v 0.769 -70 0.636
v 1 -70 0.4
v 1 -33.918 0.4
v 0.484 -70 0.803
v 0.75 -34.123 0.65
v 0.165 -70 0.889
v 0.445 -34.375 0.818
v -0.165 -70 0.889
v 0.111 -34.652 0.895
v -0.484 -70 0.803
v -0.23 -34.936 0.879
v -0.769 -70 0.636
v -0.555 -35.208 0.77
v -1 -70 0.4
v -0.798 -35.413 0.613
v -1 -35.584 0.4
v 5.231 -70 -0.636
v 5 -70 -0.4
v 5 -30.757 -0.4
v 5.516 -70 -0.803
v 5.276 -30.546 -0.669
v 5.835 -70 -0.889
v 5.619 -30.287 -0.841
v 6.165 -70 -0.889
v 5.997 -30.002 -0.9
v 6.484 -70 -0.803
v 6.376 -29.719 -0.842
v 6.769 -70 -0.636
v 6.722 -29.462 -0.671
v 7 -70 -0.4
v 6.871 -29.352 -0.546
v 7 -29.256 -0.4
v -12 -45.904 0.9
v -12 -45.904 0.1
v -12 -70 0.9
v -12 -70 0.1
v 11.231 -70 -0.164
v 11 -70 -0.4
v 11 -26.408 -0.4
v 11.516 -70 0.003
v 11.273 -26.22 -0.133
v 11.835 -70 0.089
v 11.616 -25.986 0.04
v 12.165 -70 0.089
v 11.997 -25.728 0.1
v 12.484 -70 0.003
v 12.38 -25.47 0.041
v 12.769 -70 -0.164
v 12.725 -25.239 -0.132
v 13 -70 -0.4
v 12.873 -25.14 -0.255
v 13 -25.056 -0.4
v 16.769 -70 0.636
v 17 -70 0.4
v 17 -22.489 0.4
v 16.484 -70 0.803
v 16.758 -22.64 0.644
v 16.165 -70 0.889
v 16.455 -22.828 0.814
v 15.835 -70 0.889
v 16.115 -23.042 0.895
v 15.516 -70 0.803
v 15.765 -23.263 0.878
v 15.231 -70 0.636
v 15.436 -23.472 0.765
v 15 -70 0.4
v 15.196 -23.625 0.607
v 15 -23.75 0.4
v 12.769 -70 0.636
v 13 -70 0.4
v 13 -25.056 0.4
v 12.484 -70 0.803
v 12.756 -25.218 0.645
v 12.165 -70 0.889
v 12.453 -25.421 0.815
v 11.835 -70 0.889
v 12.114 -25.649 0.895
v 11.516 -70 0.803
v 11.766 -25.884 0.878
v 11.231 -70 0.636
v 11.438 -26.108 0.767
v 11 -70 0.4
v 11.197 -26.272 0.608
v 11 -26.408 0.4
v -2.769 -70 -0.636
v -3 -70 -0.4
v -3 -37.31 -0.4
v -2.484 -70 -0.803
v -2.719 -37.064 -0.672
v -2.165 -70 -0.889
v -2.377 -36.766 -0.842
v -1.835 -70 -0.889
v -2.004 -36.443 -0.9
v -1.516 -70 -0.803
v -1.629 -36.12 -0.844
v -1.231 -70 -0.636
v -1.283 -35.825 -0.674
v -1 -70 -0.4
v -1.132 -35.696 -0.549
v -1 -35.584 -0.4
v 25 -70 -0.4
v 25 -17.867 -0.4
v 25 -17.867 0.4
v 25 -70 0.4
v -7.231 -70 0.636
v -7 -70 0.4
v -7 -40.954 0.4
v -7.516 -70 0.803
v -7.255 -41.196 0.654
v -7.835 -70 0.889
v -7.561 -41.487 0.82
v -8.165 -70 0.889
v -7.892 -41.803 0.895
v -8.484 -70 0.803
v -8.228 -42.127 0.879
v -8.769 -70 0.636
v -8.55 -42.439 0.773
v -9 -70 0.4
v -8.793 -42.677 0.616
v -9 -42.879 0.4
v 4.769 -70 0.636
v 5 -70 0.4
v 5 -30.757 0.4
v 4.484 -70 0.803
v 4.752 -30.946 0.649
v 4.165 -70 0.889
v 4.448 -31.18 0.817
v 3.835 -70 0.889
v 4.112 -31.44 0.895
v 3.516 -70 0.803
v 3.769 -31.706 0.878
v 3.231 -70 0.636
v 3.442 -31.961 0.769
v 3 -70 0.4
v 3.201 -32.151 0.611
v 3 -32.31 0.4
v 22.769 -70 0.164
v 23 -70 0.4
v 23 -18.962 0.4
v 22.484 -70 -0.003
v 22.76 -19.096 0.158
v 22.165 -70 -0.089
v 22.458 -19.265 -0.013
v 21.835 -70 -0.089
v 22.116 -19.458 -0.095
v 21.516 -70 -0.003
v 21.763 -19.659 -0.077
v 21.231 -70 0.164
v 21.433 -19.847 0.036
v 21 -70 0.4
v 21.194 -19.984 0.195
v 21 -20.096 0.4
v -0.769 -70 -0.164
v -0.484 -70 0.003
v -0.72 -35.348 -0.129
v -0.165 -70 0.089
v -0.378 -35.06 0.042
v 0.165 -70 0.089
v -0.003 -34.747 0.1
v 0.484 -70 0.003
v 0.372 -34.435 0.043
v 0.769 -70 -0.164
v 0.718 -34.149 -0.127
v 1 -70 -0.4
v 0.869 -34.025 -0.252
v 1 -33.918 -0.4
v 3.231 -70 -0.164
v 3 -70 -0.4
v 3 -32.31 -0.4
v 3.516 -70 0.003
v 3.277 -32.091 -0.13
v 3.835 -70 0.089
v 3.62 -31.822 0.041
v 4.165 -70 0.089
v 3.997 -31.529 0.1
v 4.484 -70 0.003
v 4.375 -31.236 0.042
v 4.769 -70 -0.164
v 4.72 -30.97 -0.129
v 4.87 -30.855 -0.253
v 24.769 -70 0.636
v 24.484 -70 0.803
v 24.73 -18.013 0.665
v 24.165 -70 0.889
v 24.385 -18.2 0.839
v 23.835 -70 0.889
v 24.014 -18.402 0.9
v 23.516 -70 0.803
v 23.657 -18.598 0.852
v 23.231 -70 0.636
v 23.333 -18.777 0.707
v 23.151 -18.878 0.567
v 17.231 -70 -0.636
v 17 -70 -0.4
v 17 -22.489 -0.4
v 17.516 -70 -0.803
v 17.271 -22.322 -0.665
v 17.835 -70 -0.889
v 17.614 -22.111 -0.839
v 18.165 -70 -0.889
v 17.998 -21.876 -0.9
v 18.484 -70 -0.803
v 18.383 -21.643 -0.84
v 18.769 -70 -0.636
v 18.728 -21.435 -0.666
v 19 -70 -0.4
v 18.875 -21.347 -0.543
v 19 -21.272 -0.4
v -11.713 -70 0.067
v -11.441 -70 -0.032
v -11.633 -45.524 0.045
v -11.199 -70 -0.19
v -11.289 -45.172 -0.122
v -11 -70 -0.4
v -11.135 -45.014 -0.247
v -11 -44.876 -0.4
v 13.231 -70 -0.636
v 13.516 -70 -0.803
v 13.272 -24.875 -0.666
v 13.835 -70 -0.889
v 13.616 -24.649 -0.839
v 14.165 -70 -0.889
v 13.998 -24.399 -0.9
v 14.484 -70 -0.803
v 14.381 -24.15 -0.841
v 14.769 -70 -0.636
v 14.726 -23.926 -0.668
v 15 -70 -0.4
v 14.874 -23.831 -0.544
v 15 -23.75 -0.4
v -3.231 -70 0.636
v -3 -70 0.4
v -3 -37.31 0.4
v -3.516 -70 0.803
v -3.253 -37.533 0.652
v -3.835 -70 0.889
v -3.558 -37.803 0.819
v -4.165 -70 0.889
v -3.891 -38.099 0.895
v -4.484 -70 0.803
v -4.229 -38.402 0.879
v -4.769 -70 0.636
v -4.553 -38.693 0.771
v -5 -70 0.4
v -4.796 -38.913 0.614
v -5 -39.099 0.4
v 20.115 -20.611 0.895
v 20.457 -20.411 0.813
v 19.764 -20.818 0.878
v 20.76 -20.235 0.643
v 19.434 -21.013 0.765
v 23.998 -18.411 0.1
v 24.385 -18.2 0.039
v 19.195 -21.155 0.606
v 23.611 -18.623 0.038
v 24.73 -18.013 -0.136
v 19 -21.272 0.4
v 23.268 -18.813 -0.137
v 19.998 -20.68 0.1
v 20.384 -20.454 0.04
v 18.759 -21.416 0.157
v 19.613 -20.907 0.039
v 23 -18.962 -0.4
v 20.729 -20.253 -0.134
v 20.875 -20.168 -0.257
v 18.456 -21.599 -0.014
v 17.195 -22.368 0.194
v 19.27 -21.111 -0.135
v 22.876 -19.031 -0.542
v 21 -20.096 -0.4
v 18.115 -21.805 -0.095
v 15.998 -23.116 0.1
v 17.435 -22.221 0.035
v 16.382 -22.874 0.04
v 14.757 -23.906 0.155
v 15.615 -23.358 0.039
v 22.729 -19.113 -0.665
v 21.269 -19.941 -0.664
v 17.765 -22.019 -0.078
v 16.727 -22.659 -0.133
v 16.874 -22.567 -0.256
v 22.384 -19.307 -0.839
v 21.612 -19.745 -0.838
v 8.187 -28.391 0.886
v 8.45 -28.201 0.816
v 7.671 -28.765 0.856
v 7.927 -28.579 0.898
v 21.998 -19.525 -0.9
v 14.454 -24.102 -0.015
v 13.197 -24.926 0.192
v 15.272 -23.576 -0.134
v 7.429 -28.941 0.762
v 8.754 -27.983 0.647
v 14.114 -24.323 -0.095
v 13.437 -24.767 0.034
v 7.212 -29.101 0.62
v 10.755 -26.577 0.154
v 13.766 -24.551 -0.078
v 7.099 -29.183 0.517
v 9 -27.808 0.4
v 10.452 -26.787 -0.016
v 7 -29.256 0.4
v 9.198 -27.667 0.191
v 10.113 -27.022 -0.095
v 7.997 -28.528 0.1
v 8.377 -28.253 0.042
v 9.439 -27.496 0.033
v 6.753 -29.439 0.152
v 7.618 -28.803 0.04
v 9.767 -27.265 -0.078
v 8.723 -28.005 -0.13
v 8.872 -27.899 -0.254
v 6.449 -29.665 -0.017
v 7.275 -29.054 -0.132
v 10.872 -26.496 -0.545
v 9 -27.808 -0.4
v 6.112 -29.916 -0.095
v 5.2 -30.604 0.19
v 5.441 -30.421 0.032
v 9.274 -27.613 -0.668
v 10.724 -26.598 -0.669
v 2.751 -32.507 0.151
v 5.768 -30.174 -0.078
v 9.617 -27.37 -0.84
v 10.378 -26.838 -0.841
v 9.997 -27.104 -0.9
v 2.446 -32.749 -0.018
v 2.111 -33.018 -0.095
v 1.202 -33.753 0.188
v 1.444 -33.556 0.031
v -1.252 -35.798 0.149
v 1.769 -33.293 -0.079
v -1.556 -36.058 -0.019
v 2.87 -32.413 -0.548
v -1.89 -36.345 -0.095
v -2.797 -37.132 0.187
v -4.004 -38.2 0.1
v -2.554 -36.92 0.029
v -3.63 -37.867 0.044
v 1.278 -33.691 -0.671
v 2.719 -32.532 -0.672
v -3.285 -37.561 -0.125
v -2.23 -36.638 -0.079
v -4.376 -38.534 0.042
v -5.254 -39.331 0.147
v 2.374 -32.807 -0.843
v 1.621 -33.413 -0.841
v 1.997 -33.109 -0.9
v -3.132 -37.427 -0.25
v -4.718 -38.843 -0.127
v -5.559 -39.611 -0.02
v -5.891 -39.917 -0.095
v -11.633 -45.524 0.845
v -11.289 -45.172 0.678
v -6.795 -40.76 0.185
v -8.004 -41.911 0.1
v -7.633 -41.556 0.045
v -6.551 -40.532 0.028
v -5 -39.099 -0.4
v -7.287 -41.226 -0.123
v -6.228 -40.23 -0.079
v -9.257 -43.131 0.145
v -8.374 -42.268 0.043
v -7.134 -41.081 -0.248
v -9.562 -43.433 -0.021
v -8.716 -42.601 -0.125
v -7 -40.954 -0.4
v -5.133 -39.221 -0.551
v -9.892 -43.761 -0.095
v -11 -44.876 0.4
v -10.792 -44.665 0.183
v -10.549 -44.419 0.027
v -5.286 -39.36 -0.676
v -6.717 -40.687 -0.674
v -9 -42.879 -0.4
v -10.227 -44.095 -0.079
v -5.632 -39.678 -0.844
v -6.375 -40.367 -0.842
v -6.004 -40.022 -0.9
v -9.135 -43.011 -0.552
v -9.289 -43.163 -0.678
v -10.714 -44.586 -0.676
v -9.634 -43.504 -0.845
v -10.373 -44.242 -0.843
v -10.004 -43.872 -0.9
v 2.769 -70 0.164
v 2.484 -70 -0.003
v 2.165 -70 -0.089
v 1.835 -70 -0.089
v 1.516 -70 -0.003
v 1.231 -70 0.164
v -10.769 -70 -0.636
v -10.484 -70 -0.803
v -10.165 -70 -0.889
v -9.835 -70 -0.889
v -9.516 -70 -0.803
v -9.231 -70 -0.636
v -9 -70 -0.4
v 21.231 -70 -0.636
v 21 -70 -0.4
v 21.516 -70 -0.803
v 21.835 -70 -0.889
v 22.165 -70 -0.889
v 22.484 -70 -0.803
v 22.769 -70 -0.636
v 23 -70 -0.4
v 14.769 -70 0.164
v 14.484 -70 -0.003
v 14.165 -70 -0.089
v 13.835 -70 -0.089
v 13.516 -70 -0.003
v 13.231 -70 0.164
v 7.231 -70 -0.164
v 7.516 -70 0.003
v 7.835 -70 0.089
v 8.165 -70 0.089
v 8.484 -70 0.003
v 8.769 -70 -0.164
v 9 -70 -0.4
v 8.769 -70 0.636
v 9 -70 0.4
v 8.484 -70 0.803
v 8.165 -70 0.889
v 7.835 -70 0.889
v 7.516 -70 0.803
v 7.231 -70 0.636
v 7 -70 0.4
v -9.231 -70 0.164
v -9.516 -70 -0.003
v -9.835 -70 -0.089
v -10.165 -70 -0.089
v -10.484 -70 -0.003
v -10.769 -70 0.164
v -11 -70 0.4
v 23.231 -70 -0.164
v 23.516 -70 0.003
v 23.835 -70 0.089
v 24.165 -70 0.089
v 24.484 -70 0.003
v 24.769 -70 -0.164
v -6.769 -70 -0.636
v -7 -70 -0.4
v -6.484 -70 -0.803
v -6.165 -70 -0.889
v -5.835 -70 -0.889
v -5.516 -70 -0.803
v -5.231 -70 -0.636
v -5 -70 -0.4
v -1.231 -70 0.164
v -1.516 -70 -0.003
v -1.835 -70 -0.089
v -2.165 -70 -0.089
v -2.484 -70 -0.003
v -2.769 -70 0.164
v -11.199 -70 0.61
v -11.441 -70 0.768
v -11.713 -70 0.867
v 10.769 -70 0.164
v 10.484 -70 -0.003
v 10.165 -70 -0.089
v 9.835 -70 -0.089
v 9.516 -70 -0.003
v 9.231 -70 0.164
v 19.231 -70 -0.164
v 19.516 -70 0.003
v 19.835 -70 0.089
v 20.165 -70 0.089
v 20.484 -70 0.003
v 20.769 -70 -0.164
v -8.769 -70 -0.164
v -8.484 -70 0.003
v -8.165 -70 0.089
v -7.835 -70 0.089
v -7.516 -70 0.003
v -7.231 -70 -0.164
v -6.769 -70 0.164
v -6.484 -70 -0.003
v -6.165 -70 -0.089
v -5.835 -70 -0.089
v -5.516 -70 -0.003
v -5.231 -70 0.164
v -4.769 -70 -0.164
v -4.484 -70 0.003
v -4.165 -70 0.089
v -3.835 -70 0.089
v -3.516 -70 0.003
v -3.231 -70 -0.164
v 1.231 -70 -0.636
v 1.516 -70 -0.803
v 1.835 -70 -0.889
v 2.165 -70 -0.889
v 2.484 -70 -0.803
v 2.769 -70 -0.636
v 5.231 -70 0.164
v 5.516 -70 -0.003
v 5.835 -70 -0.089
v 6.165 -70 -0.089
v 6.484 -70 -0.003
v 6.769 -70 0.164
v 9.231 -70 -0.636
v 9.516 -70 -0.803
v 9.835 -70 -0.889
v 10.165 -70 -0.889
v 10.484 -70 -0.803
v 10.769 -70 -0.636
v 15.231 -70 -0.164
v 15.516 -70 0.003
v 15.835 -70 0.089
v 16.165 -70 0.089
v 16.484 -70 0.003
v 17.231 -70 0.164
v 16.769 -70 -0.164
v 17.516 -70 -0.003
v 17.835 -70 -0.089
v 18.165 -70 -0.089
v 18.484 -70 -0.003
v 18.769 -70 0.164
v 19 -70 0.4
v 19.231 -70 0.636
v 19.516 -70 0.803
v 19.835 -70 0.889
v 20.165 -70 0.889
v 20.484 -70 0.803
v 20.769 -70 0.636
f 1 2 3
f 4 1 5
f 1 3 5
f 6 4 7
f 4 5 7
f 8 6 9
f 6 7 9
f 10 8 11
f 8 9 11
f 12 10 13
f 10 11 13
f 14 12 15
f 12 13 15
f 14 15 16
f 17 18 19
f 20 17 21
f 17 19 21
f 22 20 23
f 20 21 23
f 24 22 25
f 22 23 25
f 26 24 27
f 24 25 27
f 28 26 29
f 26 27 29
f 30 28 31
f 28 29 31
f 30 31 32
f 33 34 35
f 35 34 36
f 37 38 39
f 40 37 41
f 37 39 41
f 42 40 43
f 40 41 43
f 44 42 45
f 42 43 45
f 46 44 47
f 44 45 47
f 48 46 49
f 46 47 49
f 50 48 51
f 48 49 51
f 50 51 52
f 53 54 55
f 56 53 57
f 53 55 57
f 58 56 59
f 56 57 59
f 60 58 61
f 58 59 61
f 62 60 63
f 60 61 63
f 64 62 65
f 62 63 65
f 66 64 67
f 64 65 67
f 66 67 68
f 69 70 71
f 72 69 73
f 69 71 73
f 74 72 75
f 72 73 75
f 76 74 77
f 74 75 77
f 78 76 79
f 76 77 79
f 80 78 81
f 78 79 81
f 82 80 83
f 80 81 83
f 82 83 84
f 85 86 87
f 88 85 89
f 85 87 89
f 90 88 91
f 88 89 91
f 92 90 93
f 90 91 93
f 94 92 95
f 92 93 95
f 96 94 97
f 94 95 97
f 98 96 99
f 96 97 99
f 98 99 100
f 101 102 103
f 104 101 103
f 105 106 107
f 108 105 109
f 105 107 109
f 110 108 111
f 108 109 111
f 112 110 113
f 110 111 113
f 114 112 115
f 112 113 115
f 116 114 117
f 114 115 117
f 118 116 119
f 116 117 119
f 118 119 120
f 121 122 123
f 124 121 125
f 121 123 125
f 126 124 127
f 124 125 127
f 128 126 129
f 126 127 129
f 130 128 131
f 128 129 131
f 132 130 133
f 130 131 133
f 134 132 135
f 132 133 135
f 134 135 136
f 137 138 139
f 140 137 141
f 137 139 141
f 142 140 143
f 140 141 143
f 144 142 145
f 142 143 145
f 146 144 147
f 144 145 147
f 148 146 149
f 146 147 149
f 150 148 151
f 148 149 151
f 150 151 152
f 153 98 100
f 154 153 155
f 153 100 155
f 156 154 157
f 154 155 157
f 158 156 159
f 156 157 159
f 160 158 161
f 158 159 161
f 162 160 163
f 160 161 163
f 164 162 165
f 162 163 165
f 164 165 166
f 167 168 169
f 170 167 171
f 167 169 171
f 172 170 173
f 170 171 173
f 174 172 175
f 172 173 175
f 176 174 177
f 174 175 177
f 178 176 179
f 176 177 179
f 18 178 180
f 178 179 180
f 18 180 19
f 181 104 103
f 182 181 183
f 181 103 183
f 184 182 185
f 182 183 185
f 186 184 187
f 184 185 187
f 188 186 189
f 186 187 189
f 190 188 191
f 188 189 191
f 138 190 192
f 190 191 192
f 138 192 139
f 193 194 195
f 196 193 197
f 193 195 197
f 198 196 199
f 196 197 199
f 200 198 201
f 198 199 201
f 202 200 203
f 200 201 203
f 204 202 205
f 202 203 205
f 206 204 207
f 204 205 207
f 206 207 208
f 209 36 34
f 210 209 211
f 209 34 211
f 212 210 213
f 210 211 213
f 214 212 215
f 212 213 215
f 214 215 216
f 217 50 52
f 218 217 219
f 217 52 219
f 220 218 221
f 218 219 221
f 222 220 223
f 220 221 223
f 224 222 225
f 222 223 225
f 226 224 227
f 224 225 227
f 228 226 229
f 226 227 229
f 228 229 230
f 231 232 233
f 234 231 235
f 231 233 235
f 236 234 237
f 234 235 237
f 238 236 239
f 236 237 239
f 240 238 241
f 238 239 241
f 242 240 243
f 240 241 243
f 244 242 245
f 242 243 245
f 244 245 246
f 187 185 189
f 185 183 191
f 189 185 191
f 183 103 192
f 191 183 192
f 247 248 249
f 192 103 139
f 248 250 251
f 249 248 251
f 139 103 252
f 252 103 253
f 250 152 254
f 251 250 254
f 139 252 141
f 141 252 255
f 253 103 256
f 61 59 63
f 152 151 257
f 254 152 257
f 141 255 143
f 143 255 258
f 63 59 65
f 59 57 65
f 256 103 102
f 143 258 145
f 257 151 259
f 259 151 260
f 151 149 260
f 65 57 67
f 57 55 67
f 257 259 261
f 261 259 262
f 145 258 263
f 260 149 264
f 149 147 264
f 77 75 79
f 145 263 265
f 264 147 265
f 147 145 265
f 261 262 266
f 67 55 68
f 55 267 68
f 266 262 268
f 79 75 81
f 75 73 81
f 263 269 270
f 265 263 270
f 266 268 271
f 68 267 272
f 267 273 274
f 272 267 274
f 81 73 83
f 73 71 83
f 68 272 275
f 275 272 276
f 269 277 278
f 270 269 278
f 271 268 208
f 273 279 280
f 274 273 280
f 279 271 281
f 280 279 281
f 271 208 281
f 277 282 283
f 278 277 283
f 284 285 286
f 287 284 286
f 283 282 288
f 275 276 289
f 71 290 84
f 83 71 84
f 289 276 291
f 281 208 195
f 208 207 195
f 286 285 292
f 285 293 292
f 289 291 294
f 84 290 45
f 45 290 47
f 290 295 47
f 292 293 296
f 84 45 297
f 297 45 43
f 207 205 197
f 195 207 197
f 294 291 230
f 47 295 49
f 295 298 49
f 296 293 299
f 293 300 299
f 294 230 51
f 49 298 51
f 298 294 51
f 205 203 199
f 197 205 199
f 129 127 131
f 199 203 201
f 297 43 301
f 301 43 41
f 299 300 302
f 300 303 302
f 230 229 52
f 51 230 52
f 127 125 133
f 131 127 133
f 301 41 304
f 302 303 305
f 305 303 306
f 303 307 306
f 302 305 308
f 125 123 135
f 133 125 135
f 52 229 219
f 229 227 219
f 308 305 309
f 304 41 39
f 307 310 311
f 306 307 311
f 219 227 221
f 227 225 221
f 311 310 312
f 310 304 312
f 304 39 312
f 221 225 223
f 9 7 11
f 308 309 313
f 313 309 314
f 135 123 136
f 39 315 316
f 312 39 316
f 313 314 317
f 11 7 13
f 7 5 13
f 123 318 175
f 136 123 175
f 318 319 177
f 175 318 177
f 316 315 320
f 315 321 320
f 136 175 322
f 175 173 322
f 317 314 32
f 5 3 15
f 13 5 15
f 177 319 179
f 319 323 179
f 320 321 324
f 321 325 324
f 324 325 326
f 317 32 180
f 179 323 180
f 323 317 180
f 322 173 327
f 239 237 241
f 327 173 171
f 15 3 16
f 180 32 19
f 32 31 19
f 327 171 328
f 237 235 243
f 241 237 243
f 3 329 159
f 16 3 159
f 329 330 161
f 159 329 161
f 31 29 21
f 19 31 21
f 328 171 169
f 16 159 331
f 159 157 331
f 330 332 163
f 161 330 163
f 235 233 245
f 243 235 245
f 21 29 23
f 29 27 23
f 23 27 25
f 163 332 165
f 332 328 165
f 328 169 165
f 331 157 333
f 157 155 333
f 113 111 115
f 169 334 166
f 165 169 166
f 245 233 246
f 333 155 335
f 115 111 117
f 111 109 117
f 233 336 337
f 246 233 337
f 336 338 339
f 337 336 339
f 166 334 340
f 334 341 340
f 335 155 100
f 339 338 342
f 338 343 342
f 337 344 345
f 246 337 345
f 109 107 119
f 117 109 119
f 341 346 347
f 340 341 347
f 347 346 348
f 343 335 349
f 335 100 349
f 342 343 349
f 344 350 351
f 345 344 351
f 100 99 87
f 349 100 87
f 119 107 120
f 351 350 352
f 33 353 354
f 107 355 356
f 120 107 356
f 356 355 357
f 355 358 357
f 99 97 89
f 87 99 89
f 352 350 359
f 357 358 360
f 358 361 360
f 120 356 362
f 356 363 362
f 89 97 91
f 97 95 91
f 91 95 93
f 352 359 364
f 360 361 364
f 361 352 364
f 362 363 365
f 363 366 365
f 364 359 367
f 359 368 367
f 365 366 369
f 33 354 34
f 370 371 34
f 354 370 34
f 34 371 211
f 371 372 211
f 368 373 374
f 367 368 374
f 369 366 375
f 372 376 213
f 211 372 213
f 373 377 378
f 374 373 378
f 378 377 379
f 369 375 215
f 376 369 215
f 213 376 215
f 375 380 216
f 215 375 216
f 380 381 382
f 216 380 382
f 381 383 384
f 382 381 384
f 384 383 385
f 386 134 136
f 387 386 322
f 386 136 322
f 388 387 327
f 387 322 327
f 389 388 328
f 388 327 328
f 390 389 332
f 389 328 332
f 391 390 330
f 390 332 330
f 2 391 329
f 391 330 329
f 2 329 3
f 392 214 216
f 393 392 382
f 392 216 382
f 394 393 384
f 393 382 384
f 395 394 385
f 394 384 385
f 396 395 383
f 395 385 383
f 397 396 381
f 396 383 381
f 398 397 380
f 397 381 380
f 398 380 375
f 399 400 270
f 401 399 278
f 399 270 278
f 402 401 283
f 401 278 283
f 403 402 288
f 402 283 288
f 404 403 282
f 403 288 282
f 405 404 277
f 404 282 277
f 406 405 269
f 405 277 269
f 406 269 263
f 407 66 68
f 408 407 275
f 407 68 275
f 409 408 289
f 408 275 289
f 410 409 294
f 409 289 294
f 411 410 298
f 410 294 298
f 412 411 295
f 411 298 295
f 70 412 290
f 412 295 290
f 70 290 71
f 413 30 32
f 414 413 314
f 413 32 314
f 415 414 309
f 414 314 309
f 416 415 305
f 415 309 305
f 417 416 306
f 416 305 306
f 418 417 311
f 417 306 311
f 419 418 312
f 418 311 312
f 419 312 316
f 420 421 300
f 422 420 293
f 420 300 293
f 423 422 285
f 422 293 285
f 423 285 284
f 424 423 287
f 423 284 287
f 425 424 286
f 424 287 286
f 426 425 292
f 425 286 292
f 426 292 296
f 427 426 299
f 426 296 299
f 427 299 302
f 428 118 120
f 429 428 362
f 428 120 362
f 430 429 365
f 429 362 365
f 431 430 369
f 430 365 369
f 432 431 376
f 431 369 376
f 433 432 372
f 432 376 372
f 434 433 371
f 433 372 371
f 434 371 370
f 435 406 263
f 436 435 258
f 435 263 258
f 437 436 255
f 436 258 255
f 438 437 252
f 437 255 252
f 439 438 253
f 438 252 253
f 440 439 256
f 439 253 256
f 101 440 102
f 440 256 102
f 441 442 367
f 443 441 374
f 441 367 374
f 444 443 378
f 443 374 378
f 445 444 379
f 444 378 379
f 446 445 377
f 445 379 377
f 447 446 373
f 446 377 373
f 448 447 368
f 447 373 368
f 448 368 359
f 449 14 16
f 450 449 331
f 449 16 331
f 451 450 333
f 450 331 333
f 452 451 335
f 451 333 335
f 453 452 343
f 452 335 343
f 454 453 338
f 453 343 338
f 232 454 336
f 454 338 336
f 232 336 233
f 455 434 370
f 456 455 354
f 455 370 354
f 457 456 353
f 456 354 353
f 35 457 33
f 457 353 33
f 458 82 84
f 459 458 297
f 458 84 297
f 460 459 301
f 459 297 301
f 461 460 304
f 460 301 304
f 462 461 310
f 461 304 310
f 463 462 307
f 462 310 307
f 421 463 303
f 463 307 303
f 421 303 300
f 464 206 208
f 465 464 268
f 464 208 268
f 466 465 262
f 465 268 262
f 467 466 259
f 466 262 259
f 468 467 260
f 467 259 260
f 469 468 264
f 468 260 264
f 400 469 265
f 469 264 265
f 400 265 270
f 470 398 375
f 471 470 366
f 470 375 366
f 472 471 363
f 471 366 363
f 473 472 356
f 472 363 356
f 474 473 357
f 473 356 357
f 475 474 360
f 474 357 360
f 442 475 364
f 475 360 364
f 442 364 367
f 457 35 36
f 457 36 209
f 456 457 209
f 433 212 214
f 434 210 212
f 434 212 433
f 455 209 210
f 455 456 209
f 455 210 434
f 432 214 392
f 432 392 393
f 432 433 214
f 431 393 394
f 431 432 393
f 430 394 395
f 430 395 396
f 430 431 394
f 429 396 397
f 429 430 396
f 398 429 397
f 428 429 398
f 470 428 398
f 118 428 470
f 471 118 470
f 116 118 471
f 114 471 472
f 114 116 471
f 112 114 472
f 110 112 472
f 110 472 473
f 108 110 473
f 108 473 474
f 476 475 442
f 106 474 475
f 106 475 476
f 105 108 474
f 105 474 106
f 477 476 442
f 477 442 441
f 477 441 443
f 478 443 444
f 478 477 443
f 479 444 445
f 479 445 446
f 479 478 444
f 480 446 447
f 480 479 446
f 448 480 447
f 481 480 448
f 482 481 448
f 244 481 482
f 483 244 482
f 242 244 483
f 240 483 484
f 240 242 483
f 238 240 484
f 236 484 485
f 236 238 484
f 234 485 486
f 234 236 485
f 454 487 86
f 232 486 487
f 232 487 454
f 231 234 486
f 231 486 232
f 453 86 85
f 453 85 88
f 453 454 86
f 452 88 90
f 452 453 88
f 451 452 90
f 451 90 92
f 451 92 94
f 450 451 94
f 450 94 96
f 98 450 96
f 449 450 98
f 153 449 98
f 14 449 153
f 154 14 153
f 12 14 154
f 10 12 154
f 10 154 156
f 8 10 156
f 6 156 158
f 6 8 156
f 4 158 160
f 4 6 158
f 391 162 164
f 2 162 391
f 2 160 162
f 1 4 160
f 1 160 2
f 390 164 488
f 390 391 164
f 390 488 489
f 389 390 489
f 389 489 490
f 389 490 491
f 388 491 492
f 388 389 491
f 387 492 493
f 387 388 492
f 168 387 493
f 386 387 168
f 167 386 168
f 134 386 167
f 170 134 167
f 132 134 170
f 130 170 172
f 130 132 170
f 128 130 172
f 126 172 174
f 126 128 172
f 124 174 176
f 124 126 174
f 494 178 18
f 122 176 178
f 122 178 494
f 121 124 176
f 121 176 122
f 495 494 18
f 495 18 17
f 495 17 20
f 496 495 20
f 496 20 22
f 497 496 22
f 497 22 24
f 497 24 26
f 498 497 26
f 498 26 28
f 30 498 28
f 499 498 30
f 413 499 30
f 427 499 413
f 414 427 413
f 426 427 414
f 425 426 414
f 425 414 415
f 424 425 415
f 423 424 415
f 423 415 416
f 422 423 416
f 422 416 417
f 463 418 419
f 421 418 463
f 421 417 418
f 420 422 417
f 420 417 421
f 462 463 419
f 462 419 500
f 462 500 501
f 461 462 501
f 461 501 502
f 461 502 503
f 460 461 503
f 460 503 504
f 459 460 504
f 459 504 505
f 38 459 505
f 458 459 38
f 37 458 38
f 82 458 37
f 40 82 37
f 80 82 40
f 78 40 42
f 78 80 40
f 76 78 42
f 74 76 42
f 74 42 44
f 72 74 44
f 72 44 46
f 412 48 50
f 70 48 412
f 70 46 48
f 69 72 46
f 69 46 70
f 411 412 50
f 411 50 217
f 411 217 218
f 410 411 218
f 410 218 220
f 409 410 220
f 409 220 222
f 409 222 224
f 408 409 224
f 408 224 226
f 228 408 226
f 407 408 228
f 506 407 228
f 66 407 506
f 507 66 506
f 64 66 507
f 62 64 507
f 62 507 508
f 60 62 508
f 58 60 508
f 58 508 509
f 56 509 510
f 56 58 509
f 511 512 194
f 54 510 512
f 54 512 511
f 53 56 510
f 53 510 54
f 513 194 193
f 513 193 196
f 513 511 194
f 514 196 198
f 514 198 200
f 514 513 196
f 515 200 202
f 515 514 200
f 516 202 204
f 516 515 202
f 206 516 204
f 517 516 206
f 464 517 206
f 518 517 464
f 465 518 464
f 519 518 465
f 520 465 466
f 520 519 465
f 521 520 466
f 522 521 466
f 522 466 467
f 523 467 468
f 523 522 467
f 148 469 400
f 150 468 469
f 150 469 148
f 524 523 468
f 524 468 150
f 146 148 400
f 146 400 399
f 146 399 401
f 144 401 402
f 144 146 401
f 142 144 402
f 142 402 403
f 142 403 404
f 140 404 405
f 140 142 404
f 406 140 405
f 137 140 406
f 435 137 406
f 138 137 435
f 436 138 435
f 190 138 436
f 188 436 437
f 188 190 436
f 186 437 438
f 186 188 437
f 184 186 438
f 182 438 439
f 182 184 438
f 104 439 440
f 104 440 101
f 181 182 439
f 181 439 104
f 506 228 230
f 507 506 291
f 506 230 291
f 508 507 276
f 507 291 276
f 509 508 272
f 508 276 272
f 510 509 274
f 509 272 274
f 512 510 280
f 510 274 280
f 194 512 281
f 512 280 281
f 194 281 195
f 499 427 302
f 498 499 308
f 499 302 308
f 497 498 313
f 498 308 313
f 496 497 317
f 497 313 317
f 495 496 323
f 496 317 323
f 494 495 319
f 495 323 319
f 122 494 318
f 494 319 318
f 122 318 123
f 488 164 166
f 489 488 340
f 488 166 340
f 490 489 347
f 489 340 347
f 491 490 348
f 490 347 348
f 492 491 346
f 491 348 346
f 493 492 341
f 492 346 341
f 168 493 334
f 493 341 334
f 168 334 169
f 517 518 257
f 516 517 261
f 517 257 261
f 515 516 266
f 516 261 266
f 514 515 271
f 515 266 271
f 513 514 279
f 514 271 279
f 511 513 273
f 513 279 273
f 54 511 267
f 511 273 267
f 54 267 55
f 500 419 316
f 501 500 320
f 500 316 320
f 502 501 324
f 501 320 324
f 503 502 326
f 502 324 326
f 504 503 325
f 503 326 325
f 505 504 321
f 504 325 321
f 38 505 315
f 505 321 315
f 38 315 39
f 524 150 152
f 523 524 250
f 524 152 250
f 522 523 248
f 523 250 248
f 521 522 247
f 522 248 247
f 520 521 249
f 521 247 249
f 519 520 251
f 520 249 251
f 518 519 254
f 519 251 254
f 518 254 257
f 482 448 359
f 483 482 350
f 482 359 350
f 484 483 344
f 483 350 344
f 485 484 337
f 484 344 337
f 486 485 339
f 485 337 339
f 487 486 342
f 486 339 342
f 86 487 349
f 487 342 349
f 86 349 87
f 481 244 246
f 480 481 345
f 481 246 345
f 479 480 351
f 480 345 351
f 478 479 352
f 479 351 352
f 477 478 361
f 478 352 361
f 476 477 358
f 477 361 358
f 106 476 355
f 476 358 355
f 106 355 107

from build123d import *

# Parameters (mm, degrees)
F1_DEPTH = 70
F3_START = -25
F3_DEPTH = 50


with BuildPart() as f1:
    # F0 (on Front) → F1 (new body)
    with BuildSketch(Plane.XZ):
        with BuildLine():
            ThreePointArc((-21, -0.4), (-20, 0.1), (-19, -0.4))
            ThreePointArc((-19, -0.4), (-18, -0.9), (-17, -0.4))
            ThreePointArc((-17, -0.4), (-16, 0.1), (-15, -0.4))
            ThreePointArc((-15, -0.4), (-14, -0.9), (-13, -0.4))
            ThreePointArc((-13, -0.4), (-12, 0.1), (-11, -0.4))
            ThreePointArc((-11, -0.4), (-10, -0.9), (-9, -0.4))
            ThreePointArc((-9, -0.4), (-8, 0.1), (-7, -0.4))
            ThreePointArc((-7, -0.4), (-6, -0.9), (-5, -0.4))
            ThreePointArc((-5, -0.4), (-4, 0.1), (-3, -0.4))
            ThreePointArc((-3, -0.4), (-2, -0.9), (-1, -0.4))
            ThreePointArc((-1, -0.4), (0, 0.1), (1, -0.4))
            ThreePointArc((1, -0.4), (2, -0.9), (3, -0.4))
            ThreePointArc((3, -0.4), (4, 0.1), (5, -0.4))
            ThreePointArc((5, -0.4), (6, -0.9), (7, -0.4))
            ThreePointArc((7, -0.4), (8, 0.1), (9, -0.4))
            ThreePointArc((9, -0.4), (10, -0.9), (11, -0.4))
            ThreePointArc((11, -0.4), (12, 0.1), (13, -0.4))
            ThreePointArc((13, -0.4), (14, -0.9), (15, -0.4))
            ThreePointArc((15, -0.4), (16, 0.1), (17, -0.4))
            ThreePointArc((17, -0.4), (18, -0.9), (19, -0.4))
            ThreePointArc((19, -0.4), (20, 0.1), (21, -0.4))
            ThreePointArc((21, -0.4), (22, -0.9), (23, -0.4))
            ThreePointArc((23, -0.4), (24, 0.1), (25, -0.4))
            Line((25, -0.4), (25, 0.4))
            ThreePointArc((25, 0.4), (24, 0.9), (23, 0.4))
            ThreePointArc((23, 0.4), (22, -0.1), (21, 0.4))
            ThreePointArc((21, 0.4), (20, 0.9), (19, 0.4))
            ThreePointArc((19, 0.4), (18, -0.1), (17, 0.4))
            ThreePointArc((17, 0.4), (16, 0.9), (15, 0.4))
            ThreePointArc((15, 0.4), (14, -0.1), (13, 0.4))
            ThreePointArc((13, 0.4), (12, 0.9), (11, 0.4))
            ThreePointArc((11, 0.4), (10, -0.1), (9, 0.4))
            ThreePointArc((9, 0.4), (8, 0.9), (7, 0.4))
            ThreePointArc((7, 0.4), (6, -0.1), (5, 0.4))
            ThreePointArc((5, 0.4), (4, 0.9), (3, 0.4))
            ThreePointArc((3, 0.4), (2, -0.1), (1, 0.4))
            ThreePointArc((1, 0.4), (0, 0.9), (-1, 0.4))
            ThreePointArc((-1, 0.4), (-2, -0.1), (-3, 0.4))
            ThreePointArc((-3, 0.4), (-4, 0.9), (-5, 0.4))
            ThreePointArc((-5, 0.4), (-6, -0.1), (-7, 0.4))
            ThreePointArc((-7, 0.4), (-8, 0.9), (-9, 0.4))
            ThreePointArc((-9, 0.4), (-10, -0.1), (-11, 0.4))
            ThreePointArc((-11, 0.4), (-12, 0.9), (-13, 0.4))
            ThreePointArc((-13, 0.4), (-14, -0.1), (-15, 0.4))
            ThreePointArc((-15, 0.4), (-16, 0.9), (-17, 0.4))
            ThreePointArc((-17, 0.4), (-18, -0.1), (-19, 0.4))
            ThreePointArc((-19, 0.4), (-20, 0.9), (-21, 0.4))
            ThreePointArc((-21, 0.4), (-22, -0.1), (-23, 0.4))
            ThreePointArc((-23, 0.4), (-24, 0.9), (-25, 0.4))
            Line((-25, 0.4), (-25, -0.4))
            ThreePointArc((-25, -0.4), (-24, 0.1), (-23, -0.4))
            ThreePointArc((-23, -0.4), (-22, -0.9), (-21, -0.4))
        make_face()
    extrude(amount=F1_DEPTH)

    # F2 (on Top) → F3 (intersect)
    with BuildSketch(Plane.XY.offset(F3_START)):
        with BuildLine():
            ThreePointArc((-12, -254.0961094374), (152.1248608016, -289.1042774324), (246, -150))
            ThreePointArc((246, -150), (152.1248608016, -10.8957225676), (-12, -45.9038905626))
            Line((-12, -45.9038905626), (-12, -150))
            Line((-12, -150), (-12, -254.0961094374))
        make_face()
    extrude(amount=F3_DEPTH, mode=Mode.INTERSECT)


solid = f1.part
